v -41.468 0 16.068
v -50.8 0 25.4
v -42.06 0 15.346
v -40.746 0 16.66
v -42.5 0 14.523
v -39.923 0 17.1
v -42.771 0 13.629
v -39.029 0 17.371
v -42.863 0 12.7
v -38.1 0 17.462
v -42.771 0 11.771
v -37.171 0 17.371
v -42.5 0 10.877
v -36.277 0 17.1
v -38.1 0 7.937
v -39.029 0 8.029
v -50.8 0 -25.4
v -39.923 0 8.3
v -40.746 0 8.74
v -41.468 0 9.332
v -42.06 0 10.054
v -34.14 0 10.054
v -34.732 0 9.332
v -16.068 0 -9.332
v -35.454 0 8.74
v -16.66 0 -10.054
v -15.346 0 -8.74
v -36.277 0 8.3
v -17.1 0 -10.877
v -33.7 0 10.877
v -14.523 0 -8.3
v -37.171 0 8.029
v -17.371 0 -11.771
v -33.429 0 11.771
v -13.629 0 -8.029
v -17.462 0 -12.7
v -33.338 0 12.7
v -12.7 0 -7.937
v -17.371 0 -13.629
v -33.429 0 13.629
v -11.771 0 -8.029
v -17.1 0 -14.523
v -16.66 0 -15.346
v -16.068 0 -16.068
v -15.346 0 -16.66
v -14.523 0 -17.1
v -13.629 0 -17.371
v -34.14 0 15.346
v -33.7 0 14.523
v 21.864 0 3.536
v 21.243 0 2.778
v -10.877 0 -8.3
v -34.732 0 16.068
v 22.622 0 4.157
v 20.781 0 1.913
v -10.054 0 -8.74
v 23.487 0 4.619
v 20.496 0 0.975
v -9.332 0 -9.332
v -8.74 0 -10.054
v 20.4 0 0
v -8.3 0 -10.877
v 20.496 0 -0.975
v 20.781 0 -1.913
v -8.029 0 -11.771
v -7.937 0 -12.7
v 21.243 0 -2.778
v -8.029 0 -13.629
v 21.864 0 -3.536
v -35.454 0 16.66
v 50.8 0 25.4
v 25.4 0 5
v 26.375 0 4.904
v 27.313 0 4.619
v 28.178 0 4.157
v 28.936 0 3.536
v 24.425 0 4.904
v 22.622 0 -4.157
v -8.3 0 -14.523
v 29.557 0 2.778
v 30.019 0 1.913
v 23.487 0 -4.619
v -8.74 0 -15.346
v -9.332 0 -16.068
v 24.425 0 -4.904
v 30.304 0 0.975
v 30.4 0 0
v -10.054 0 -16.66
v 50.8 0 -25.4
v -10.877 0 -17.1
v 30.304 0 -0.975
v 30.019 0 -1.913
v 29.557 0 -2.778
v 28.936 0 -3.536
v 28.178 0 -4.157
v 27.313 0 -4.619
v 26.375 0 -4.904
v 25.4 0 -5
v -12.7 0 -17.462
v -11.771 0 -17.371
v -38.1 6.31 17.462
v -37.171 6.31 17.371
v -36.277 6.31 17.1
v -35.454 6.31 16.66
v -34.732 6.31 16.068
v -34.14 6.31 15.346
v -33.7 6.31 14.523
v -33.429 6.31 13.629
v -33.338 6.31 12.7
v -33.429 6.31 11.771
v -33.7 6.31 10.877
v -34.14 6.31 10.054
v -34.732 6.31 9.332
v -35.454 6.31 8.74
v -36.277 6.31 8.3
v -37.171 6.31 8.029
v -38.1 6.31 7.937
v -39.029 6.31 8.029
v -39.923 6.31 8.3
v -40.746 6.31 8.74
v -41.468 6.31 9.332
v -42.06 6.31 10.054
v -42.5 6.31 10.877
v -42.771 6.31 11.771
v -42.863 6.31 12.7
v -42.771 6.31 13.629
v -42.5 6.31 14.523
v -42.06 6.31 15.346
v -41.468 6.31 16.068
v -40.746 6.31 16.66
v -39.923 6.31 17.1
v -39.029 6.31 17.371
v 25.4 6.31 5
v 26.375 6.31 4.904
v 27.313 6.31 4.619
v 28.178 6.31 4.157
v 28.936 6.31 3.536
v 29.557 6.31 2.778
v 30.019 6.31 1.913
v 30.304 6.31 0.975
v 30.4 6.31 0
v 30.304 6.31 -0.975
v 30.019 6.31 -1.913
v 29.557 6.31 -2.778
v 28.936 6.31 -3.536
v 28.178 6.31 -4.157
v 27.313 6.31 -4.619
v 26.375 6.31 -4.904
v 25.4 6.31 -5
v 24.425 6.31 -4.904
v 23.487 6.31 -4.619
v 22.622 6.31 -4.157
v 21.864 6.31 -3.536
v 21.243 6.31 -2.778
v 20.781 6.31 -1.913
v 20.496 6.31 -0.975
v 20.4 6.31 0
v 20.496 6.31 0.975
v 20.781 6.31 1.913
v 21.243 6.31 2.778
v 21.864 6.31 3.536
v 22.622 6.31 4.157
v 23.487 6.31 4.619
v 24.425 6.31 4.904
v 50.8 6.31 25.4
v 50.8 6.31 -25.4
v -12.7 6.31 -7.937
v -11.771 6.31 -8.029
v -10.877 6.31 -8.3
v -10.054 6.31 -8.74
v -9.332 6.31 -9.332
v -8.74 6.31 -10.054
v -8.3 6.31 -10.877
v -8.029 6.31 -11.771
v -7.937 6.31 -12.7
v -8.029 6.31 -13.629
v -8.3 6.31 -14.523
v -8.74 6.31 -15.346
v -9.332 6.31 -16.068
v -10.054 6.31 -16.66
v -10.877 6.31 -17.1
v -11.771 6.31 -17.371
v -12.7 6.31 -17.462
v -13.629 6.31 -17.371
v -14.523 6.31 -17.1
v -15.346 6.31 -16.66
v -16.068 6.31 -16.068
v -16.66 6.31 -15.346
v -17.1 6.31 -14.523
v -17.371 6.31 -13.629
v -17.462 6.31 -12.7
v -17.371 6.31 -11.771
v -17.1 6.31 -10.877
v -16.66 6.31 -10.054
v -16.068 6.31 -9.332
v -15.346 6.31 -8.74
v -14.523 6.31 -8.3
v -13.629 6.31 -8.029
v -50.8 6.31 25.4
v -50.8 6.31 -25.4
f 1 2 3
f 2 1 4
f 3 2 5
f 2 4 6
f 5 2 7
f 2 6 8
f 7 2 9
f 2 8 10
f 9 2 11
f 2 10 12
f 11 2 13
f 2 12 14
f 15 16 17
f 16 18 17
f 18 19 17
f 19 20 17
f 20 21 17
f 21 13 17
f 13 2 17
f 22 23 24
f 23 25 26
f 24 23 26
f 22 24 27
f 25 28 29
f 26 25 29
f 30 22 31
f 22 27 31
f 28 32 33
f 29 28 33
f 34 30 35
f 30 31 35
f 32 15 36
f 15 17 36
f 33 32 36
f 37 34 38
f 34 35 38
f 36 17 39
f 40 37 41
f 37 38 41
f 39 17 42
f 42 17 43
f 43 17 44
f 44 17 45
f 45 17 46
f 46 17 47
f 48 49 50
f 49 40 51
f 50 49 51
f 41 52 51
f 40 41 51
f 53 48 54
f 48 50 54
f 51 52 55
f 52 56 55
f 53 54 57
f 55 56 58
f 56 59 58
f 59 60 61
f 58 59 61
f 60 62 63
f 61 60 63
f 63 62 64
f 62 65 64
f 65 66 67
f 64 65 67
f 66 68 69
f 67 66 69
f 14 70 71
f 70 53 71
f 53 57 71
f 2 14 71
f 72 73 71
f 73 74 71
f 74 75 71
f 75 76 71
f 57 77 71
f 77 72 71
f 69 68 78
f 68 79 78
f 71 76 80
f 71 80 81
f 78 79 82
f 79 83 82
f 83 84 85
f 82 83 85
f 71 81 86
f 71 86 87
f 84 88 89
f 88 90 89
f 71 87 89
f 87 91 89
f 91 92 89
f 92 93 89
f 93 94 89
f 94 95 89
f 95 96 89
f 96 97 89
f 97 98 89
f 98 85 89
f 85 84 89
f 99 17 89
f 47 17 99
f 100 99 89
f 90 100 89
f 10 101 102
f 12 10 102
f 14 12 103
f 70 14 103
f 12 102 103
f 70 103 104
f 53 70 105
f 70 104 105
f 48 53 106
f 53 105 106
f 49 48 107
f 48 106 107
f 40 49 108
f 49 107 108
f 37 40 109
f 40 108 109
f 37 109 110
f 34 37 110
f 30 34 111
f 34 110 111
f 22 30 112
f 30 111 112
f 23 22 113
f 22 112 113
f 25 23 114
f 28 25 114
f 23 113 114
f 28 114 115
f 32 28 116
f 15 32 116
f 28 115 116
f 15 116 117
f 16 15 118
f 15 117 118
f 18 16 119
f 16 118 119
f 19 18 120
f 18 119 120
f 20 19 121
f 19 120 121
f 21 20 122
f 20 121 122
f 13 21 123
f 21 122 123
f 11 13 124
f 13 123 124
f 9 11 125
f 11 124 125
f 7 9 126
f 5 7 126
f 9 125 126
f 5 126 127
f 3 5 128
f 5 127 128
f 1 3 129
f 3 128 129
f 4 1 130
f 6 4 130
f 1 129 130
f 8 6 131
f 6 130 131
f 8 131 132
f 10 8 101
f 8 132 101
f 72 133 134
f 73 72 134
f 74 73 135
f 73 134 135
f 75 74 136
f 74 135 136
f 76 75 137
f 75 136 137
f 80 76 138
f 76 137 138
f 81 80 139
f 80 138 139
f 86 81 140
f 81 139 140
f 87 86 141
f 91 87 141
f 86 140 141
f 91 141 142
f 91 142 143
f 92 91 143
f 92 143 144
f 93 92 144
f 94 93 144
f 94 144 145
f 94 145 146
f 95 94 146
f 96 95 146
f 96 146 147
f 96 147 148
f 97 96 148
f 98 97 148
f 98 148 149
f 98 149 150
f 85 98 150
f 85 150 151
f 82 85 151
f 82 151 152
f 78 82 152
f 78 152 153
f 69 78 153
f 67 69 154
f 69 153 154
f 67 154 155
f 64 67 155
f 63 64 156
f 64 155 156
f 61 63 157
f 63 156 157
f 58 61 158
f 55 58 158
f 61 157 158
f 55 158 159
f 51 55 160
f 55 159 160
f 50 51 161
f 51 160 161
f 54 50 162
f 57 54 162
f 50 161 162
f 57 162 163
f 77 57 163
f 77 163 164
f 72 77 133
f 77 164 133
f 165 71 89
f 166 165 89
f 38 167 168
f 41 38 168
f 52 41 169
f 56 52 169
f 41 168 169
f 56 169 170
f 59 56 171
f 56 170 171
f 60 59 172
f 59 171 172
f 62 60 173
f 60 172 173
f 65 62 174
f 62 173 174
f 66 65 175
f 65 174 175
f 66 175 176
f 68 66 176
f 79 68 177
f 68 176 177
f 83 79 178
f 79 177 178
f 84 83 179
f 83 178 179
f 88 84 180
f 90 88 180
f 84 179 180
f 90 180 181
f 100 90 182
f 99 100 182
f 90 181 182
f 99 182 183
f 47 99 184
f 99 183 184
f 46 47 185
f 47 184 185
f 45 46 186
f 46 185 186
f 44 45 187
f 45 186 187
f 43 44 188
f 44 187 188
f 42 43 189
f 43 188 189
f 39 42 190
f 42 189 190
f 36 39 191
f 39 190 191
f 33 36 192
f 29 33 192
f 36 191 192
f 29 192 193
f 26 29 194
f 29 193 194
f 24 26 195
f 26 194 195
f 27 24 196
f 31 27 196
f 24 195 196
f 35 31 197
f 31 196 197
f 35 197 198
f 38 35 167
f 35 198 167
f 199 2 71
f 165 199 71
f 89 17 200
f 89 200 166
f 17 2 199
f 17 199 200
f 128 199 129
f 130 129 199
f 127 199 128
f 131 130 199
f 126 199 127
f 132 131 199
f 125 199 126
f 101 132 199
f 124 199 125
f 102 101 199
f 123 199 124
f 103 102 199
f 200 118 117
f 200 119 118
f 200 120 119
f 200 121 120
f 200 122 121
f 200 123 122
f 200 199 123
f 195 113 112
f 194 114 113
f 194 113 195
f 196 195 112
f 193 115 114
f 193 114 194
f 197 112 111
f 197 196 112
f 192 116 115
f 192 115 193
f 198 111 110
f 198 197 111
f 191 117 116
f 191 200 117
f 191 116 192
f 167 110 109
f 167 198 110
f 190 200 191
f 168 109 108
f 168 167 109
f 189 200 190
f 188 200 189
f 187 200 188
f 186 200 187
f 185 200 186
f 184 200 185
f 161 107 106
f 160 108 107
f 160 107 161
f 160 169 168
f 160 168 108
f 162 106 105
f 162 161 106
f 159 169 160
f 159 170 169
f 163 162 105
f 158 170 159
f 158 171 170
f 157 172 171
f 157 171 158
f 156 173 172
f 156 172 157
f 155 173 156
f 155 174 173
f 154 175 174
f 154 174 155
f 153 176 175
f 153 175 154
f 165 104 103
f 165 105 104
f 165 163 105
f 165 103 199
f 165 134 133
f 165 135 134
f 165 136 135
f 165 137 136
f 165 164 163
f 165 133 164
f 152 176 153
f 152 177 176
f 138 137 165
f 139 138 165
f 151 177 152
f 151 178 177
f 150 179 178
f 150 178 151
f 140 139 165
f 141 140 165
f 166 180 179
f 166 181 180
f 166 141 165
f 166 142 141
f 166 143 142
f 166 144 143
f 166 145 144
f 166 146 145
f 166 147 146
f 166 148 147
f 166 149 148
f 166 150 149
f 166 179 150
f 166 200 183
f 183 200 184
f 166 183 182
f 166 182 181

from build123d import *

# Parameters (mm, degrees)
CROQUIS1_W              = 101.6
CROQUIS1_H              = 50.8
SALIENTE_EXTRUIR1_DEPTH = 6.31
CROQUIS2_R              = 4.7625
CORTAR_EXTRUIR1_DEPTH   = 6.31
CROQUIS3_R              = 5
CORTAR_EXTRUIR2_DEPTH   = 10


with BuildPart() as part:
    # Croquis1 → Saliente-Extruir1 (new body)
    with BuildSketch(Plane(origin=(0, 0, 0), x_dir=(1, 0, 0), z_dir=(0, 1, 0))):
        Rectangle(CROQUIS1_W, CROQUIS1_H)
    extrude(amount=SALIENTE_EXTRUIR1_DEPTH)

    # Croquis2 → Cortar-Extruir1 (cut)
    with BuildSketch(Plane(origin=(0, 6.31, 0), x_dir=(1, 0, 0), z_dir=(0, 1, 0))):
        with Locations(Location((-38.1, -12.7, 0), (0, 0, 270))):
            Circle(CROQUIS2_R)
        with Locations(Location((-12.7, 12.7, 0), (0, 0, 270))):
            Circle(CROQUIS2_R)
    extrude(amount=-CORTAR_EXTRUIR1_DEPTH, mode=Mode.SUBTRACT)

    # Croquis3 → Cortar-Extruir2 (cut)
    with BuildSketch(Plane(origin=(0, 6.31, 0), x_dir=(1, 0, 0), z_dir=(0, 1, 0))):
        with Locations(Location((25.4, 0, 0), (0, 0, 270))):
            Circle(CROQUIS3_R)
    extrude(amount=-CORTAR_EXTRUIR2_DEPTH, mode=Mode.SUBTRACT)


solid = part.part
